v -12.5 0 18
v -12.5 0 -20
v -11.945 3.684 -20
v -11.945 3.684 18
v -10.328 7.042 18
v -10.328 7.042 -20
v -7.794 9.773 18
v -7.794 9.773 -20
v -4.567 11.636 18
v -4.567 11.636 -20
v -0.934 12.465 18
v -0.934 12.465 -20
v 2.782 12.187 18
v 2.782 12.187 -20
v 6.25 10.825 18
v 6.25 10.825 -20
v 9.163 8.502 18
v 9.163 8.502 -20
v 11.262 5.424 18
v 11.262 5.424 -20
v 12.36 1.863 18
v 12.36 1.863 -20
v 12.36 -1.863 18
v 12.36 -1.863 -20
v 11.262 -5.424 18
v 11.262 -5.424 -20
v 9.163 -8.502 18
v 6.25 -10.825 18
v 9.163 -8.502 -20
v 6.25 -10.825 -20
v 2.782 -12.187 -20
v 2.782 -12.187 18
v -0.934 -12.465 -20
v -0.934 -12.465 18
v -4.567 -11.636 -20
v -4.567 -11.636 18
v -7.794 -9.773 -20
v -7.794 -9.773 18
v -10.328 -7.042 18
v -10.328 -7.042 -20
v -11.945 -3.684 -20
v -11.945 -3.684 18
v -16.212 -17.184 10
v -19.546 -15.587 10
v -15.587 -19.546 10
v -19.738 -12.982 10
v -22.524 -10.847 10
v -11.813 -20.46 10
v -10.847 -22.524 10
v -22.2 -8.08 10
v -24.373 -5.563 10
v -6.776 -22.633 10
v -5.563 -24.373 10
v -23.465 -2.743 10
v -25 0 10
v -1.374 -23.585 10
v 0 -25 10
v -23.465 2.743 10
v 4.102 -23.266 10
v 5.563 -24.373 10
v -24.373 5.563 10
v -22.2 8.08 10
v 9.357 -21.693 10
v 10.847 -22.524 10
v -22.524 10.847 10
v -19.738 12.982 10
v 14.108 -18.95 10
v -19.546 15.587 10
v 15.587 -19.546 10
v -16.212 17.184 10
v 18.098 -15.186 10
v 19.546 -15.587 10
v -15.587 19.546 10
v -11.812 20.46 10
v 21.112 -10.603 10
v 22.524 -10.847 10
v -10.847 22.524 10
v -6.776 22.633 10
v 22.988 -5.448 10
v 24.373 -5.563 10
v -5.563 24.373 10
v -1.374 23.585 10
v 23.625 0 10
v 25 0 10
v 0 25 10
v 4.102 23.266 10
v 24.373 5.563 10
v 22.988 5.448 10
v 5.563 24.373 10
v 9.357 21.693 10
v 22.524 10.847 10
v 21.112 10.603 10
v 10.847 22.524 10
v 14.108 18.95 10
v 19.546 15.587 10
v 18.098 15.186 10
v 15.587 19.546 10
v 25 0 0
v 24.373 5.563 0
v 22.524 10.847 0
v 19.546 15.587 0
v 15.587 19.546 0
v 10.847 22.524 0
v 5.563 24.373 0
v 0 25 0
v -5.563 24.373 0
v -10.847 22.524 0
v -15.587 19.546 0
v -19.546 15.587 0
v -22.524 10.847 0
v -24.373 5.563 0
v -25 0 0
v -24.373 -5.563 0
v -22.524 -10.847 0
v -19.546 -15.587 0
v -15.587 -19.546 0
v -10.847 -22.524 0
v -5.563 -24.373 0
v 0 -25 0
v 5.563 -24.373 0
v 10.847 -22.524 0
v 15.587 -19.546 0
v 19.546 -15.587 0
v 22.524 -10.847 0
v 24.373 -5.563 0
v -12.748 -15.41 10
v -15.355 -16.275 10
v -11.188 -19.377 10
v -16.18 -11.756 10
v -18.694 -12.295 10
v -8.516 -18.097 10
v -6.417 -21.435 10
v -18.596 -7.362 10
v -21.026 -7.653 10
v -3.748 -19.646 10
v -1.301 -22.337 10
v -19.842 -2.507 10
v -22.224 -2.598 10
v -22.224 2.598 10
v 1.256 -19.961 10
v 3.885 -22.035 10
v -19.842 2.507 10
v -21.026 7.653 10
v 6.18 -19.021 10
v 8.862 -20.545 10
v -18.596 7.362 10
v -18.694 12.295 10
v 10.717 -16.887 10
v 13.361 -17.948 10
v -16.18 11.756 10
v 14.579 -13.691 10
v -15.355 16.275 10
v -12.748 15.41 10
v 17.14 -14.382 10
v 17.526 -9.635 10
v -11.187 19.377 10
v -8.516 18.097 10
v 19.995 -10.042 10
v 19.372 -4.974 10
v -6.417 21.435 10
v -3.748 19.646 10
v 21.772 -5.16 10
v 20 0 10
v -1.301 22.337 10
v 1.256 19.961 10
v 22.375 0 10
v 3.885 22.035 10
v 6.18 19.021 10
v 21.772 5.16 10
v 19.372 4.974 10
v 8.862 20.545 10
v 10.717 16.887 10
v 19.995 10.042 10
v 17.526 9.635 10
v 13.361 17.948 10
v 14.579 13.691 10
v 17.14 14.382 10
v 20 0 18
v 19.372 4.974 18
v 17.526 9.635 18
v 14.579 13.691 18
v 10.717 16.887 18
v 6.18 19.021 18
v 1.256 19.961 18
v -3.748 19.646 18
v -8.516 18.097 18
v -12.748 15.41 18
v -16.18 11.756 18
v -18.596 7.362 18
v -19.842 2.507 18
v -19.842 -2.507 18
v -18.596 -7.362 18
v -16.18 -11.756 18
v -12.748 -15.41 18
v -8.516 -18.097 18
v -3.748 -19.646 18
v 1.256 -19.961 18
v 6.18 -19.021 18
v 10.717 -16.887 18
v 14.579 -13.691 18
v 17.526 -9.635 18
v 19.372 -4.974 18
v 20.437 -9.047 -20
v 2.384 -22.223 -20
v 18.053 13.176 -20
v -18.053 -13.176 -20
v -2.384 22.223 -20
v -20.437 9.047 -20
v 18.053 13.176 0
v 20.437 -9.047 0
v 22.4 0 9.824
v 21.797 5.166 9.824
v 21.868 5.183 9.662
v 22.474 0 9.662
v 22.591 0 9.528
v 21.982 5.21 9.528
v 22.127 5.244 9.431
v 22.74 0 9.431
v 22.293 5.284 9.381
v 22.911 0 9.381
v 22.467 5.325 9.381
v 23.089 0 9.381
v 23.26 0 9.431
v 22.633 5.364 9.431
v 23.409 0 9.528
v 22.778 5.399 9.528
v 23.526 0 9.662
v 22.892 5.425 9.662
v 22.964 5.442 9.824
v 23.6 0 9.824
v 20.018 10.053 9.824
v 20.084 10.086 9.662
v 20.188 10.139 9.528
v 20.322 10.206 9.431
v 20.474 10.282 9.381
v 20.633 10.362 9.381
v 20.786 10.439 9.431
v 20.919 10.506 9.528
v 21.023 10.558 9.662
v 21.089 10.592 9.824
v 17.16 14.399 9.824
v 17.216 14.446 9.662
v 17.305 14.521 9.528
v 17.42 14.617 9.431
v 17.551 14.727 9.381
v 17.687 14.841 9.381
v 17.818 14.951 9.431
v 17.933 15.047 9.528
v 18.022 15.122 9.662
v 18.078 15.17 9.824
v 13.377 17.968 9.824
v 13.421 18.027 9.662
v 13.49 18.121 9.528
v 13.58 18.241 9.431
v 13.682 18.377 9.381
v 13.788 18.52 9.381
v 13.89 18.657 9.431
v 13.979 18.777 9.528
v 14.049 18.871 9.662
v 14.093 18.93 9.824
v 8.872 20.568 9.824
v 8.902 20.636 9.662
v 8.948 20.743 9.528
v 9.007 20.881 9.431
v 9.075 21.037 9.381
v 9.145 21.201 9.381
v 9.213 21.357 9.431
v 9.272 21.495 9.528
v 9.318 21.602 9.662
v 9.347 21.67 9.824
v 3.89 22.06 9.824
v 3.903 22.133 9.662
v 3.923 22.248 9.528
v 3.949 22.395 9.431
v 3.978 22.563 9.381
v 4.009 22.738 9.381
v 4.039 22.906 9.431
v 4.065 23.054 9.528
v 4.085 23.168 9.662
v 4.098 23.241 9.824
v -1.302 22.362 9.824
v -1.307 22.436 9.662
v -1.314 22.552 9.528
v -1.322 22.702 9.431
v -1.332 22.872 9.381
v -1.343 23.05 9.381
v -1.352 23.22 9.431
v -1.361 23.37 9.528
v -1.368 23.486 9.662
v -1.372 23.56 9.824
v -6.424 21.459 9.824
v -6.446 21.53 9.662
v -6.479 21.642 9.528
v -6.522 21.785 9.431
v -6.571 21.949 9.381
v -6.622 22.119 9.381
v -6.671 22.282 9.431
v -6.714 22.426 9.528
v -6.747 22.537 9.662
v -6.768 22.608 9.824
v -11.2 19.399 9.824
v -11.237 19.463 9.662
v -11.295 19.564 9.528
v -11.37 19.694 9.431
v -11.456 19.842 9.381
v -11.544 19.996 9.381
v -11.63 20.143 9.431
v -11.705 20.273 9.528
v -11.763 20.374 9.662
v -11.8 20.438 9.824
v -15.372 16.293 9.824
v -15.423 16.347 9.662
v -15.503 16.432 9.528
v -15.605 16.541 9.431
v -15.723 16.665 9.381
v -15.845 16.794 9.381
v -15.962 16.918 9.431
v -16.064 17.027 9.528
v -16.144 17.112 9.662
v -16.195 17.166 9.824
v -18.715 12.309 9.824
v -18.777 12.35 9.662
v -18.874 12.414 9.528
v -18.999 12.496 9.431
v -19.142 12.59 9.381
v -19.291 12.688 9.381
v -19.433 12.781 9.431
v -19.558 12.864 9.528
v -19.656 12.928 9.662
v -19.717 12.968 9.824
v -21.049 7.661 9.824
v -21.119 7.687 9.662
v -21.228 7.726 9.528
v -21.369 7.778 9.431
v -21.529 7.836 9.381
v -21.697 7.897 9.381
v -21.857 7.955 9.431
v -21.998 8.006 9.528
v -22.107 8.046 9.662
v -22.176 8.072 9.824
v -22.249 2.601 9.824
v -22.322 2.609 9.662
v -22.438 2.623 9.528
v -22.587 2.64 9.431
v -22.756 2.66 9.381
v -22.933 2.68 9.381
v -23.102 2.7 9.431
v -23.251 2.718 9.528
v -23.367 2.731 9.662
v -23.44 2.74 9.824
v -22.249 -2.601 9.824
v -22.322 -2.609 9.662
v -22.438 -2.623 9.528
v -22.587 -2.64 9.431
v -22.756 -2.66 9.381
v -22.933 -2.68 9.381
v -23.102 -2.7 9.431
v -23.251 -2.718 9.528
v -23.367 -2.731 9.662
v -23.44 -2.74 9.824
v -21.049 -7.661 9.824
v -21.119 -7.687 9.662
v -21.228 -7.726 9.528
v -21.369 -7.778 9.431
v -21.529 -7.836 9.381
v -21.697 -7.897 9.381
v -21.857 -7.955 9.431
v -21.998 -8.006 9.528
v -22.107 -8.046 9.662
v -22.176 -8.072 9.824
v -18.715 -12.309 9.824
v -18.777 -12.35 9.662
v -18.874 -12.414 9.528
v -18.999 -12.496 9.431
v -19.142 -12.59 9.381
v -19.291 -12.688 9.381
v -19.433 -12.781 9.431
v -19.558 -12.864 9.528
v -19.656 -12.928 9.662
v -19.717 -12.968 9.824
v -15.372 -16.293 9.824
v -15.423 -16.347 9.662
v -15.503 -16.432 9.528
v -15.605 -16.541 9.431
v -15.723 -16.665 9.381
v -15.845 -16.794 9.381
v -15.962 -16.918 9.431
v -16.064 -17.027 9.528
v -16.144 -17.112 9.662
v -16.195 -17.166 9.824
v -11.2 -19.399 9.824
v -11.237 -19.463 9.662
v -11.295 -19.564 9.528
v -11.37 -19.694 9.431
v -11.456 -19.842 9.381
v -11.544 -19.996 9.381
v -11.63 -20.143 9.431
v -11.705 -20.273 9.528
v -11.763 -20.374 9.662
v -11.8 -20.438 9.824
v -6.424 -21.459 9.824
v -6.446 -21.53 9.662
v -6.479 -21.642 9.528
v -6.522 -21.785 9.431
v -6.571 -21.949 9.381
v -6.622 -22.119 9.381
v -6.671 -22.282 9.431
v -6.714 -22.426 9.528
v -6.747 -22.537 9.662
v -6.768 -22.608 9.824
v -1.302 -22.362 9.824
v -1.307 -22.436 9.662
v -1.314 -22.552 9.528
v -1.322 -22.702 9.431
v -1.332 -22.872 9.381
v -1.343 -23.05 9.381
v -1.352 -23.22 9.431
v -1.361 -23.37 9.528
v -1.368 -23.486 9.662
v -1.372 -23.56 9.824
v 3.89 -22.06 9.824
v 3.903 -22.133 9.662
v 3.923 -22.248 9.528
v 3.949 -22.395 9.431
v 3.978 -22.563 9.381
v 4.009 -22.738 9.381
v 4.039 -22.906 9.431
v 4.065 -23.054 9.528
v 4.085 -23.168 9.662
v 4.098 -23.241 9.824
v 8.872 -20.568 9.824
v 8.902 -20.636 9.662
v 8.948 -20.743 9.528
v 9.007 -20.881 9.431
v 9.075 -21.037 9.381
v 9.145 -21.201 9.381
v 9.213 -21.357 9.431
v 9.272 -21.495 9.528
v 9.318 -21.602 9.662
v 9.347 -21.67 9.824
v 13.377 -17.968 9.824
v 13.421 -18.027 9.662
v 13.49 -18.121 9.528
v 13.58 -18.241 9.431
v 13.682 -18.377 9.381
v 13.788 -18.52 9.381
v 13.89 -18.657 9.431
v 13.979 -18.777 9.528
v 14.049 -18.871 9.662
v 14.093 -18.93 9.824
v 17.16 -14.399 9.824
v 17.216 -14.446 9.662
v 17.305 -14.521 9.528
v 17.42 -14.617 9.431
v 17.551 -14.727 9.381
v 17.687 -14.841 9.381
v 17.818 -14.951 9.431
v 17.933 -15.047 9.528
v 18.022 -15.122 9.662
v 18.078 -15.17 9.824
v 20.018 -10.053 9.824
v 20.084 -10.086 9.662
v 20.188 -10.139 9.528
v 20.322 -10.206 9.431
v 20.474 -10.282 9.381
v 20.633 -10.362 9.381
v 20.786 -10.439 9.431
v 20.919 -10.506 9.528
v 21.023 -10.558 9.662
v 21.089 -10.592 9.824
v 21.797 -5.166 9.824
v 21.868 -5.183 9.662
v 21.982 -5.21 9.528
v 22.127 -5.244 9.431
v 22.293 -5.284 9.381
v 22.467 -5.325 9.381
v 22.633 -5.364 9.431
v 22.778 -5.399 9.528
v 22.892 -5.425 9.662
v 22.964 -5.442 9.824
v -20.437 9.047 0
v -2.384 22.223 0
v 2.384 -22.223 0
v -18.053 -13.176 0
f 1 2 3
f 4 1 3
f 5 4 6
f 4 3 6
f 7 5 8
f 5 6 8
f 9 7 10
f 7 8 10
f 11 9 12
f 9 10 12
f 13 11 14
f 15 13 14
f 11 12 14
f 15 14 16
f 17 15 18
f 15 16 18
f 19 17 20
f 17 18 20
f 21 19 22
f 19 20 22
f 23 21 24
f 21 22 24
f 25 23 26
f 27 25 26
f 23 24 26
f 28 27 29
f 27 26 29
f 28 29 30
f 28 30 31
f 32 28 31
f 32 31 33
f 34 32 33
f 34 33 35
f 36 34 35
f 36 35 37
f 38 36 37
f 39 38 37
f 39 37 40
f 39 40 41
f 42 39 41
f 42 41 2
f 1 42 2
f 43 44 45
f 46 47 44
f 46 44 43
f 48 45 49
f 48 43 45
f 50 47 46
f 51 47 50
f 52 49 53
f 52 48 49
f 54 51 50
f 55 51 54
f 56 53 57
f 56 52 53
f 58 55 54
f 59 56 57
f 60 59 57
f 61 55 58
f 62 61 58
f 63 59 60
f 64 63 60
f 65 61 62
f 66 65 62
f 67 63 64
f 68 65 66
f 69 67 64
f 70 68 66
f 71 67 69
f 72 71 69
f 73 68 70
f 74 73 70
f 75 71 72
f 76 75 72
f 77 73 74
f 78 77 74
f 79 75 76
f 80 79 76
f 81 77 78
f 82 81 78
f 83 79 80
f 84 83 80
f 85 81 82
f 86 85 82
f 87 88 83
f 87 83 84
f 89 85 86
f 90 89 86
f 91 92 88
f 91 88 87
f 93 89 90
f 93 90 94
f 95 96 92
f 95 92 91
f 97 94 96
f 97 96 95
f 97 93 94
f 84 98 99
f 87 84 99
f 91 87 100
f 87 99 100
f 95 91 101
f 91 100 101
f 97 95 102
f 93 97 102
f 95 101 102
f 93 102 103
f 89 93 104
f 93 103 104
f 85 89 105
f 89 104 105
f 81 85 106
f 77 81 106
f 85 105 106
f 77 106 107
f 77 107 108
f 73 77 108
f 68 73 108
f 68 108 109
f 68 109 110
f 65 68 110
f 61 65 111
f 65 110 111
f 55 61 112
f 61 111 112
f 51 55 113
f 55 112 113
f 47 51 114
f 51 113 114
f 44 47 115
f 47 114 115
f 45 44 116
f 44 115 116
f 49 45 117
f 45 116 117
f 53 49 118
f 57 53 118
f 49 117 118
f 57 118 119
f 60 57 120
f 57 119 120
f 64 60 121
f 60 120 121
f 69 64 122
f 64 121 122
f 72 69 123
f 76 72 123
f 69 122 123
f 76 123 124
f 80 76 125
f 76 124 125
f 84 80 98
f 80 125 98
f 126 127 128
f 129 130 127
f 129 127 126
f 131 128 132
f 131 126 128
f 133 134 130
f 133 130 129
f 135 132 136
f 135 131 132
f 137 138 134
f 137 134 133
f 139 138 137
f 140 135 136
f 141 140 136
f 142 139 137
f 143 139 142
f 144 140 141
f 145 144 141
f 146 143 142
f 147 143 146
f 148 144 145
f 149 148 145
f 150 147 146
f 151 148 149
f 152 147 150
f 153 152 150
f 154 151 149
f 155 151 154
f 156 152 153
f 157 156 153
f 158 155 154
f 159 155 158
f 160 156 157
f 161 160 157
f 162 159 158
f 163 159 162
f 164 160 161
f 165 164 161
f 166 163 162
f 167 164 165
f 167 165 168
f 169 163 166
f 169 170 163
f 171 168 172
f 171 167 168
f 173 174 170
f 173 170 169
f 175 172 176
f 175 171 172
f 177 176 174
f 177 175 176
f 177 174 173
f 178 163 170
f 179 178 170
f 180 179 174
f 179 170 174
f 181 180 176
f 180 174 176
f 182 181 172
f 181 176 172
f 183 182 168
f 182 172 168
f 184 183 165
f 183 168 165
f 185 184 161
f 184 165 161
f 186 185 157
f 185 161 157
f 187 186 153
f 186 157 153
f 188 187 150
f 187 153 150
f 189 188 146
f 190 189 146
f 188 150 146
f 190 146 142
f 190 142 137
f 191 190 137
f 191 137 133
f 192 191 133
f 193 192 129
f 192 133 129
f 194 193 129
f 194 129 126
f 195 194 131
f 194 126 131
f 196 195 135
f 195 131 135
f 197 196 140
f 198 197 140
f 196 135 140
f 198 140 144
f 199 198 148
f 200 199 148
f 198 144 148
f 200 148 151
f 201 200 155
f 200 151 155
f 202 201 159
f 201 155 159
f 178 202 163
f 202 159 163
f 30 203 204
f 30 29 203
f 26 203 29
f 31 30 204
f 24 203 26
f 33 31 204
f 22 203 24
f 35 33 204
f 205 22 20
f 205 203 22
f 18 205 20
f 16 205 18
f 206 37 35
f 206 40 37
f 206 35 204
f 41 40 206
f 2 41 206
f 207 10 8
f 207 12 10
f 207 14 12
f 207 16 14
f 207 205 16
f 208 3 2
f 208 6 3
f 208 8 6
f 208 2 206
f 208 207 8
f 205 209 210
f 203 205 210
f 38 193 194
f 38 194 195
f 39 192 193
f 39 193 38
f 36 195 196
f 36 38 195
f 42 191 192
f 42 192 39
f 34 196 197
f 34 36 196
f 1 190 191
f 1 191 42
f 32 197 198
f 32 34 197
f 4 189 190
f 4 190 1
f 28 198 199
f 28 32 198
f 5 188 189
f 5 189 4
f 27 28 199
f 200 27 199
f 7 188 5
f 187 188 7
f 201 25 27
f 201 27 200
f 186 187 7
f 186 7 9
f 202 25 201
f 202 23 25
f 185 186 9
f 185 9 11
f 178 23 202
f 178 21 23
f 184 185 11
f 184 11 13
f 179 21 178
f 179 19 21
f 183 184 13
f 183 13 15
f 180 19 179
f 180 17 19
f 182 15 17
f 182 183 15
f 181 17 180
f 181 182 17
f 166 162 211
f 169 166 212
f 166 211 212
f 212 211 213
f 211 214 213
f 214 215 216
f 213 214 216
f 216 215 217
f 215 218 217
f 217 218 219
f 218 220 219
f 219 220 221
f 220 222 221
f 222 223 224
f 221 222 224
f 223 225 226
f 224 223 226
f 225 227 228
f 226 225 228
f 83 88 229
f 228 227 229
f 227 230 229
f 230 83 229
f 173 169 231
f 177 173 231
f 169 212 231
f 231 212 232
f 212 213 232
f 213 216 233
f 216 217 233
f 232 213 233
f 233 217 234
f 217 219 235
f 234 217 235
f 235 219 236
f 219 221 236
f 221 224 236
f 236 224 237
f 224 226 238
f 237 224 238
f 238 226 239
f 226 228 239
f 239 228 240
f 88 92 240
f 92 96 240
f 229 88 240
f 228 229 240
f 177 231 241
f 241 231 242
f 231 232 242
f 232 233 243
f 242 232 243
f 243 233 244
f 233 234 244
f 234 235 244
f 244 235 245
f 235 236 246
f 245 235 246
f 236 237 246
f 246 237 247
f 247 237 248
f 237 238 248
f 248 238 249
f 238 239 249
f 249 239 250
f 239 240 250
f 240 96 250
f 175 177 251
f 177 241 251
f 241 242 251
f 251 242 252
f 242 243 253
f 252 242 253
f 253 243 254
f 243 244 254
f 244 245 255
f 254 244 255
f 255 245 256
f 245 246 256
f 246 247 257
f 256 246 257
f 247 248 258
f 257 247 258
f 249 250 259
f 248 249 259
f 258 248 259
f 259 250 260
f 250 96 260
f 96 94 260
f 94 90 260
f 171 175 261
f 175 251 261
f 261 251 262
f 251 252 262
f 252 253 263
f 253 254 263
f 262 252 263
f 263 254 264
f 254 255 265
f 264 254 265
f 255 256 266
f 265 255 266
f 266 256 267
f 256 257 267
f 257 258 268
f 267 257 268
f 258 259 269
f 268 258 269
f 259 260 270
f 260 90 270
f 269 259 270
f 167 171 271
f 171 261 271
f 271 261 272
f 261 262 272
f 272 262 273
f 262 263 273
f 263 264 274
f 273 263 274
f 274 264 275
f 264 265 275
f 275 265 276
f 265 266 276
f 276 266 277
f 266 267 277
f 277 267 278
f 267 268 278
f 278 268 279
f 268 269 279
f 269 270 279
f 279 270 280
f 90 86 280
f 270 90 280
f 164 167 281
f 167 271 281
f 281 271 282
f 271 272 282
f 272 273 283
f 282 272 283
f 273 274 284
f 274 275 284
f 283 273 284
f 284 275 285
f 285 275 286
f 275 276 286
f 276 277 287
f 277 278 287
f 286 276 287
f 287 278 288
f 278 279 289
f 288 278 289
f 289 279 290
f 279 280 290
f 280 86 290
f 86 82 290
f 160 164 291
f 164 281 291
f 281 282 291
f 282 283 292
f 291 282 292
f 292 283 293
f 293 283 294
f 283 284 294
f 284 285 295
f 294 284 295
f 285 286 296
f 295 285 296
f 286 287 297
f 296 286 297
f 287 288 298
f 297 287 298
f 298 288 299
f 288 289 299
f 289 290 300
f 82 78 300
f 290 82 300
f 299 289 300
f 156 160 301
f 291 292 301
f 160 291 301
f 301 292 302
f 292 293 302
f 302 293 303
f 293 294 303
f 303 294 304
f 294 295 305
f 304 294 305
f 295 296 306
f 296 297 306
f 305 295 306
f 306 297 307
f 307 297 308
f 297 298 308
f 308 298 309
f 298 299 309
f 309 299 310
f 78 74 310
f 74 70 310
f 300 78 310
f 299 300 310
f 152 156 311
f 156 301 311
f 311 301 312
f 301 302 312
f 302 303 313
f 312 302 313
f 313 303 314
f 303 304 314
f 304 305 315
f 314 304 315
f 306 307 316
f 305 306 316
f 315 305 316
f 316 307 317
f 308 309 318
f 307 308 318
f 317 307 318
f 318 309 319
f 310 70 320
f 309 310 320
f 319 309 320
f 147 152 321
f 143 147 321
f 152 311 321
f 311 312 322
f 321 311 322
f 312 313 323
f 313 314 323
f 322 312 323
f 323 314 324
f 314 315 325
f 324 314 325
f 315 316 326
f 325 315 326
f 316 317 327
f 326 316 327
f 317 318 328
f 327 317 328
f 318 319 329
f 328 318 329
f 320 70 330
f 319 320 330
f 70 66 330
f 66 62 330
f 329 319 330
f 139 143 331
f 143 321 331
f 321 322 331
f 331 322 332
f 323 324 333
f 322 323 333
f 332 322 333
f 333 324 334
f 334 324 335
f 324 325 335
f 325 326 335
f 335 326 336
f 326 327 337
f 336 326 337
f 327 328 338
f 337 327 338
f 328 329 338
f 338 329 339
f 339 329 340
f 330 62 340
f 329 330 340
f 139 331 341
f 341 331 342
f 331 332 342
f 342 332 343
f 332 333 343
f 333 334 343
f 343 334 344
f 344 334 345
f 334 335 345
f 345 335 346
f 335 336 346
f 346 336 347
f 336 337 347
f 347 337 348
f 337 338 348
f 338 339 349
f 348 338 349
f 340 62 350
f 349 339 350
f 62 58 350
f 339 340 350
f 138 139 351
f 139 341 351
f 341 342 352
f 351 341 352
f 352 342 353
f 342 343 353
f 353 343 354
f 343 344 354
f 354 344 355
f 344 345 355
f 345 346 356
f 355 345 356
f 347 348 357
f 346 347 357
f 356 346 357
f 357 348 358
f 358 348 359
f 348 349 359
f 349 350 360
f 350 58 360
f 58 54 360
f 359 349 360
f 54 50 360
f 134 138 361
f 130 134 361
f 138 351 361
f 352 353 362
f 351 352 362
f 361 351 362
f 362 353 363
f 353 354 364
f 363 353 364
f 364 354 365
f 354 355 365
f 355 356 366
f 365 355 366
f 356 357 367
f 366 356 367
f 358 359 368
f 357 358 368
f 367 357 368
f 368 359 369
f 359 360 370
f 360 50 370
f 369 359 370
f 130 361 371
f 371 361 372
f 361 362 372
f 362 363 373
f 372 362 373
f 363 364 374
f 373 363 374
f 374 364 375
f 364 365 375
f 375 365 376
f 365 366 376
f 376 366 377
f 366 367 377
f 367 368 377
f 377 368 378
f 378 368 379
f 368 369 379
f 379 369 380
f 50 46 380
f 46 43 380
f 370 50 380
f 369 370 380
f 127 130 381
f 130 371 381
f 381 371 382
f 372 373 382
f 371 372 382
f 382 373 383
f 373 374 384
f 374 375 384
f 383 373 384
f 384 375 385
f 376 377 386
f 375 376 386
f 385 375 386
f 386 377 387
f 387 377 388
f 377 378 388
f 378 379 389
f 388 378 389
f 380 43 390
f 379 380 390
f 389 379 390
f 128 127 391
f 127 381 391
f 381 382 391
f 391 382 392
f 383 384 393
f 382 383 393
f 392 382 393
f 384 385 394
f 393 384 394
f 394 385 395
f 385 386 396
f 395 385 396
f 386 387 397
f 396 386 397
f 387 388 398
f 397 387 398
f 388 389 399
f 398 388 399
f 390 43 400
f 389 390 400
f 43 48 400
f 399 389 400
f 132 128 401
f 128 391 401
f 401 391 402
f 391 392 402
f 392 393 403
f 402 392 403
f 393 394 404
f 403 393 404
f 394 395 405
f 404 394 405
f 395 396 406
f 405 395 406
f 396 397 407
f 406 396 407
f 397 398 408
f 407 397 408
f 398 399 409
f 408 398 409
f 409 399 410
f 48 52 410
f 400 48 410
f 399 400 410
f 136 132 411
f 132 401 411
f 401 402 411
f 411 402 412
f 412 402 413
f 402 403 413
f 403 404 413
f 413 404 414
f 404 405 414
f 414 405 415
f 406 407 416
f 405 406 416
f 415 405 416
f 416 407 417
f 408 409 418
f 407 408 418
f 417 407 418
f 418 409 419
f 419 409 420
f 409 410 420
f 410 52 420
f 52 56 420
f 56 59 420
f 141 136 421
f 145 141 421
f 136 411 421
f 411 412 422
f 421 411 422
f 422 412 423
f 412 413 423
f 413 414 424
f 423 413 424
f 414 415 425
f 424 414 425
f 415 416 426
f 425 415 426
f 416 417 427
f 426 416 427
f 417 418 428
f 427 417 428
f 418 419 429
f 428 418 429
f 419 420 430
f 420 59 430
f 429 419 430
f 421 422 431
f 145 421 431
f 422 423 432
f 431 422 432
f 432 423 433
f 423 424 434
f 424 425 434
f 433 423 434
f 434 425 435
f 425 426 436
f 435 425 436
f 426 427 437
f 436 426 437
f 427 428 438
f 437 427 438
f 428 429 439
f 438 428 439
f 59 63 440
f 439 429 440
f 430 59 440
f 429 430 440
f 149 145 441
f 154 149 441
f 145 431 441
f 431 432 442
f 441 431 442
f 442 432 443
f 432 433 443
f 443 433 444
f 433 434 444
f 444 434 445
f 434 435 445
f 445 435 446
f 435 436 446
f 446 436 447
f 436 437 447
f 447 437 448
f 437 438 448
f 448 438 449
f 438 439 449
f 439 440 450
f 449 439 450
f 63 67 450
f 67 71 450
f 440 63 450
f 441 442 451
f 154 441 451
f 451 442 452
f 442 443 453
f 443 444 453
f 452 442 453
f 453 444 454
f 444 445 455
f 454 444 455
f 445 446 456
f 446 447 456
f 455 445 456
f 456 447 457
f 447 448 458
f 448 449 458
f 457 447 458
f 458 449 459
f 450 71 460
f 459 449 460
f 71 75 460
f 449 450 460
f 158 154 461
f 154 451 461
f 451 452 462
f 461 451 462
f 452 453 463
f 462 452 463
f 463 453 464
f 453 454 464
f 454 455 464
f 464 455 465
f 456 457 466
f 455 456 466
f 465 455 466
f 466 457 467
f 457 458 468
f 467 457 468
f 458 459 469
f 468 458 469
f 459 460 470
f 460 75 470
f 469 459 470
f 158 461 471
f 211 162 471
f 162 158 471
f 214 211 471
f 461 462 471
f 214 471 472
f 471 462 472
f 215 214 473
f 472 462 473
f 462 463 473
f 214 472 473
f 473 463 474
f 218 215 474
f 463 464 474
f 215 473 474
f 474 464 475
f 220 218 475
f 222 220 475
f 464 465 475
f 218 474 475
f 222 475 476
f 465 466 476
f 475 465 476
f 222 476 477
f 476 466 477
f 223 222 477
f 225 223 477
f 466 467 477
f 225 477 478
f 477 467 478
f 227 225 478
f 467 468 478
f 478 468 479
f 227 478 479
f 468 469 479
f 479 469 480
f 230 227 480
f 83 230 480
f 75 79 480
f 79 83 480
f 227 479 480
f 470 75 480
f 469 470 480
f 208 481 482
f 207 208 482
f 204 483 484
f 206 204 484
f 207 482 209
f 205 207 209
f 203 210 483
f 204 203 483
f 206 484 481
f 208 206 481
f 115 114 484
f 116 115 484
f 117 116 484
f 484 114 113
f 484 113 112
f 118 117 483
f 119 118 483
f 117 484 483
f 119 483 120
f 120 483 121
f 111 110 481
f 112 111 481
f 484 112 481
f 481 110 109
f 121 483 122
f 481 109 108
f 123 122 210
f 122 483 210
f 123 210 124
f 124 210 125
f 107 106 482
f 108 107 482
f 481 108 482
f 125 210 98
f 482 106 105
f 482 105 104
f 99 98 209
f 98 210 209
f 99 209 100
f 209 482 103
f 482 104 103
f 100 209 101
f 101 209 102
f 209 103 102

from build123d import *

# Parameters (mm, degrees)
SKETCH2_R            = 25
BOSS_EXTRUDE1_DEPTH  = 10
SKETCH3_R            = 20
BOSS_EXTRUDE2_DEPTH  = 8
BOSS_EXTRUDE3_DEPTH  = 20
SKETCH5_R            = 12.5
CUT_EXTRUDE1_DEPTH   = 52.903757089
CUT_SWEEP1_PROFILE_R = 0.625


with BuildPart() as part:
    # Sketch2 → Boss-Extrude1 (new body)
    with BuildSketch(Plane.XY):
        Circle(SKETCH2_R)
    extrude(amount=BOSS_EXTRUDE1_DEPTH)

    # Sketch3 → Boss-Extrude2 (add)
    with BuildSketch(Plane.XY.offset(10)):
        Circle(SKETCH3_R)
    extrude(amount=BOSS_EXTRUDE2_DEPTH)

    # Sketch4 → Boss-Extrude3 (add)
    with BuildSketch(Plane(origin=(0, 0, 0), x_dir=(-1, 0, 0), z_dir=(0, 0, -1))):
        Polygon((-20.437108974, -9.047000469), (-2.383622252, -22.222555786), (18.053486721, -13.175555316), (20.437108974, 9.047000469), (2.383622252, 22.222555786), (-18.053486721, 13.175555316), align=None)
    extrude(amount=BOSS_EXTRUDE3_DEPTH)

    # Sketch5 → Cut-Extrude1 (cut, through all)
    with BuildSketch(Plane(origin=(0, 0, -20), x_dir=(-1, 0, 0), z_dir=(0, 0, -1))):
        Circle(SKETCH5_R)
    extrude(amount=-CUT_EXTRUDE1_DEPTH, mode=Mode.SUBTRACT)

    # Cut-Sweep1: sweep along a path in Sketch6
    with BuildLine(Plane.XY.offset(10)) as cut_sweep1_path:
        CenterArc((0, 0), 23, 0, 360)
    # Cut-Sweep1 profile (on start of the path) → Cut-Sweep1 (sweep, cut)
    with BuildSketch(Plane(origin=(23, 0, 10), x_dir=(0, 0, 1), z_dir=(0, 1, 0))):
        Circle(CUT_SWEEP1_PROFILE_R)
    sweep(path=cut_sweep1_path.line, mode=Mode.SUBTRACT)


solid = part.part
